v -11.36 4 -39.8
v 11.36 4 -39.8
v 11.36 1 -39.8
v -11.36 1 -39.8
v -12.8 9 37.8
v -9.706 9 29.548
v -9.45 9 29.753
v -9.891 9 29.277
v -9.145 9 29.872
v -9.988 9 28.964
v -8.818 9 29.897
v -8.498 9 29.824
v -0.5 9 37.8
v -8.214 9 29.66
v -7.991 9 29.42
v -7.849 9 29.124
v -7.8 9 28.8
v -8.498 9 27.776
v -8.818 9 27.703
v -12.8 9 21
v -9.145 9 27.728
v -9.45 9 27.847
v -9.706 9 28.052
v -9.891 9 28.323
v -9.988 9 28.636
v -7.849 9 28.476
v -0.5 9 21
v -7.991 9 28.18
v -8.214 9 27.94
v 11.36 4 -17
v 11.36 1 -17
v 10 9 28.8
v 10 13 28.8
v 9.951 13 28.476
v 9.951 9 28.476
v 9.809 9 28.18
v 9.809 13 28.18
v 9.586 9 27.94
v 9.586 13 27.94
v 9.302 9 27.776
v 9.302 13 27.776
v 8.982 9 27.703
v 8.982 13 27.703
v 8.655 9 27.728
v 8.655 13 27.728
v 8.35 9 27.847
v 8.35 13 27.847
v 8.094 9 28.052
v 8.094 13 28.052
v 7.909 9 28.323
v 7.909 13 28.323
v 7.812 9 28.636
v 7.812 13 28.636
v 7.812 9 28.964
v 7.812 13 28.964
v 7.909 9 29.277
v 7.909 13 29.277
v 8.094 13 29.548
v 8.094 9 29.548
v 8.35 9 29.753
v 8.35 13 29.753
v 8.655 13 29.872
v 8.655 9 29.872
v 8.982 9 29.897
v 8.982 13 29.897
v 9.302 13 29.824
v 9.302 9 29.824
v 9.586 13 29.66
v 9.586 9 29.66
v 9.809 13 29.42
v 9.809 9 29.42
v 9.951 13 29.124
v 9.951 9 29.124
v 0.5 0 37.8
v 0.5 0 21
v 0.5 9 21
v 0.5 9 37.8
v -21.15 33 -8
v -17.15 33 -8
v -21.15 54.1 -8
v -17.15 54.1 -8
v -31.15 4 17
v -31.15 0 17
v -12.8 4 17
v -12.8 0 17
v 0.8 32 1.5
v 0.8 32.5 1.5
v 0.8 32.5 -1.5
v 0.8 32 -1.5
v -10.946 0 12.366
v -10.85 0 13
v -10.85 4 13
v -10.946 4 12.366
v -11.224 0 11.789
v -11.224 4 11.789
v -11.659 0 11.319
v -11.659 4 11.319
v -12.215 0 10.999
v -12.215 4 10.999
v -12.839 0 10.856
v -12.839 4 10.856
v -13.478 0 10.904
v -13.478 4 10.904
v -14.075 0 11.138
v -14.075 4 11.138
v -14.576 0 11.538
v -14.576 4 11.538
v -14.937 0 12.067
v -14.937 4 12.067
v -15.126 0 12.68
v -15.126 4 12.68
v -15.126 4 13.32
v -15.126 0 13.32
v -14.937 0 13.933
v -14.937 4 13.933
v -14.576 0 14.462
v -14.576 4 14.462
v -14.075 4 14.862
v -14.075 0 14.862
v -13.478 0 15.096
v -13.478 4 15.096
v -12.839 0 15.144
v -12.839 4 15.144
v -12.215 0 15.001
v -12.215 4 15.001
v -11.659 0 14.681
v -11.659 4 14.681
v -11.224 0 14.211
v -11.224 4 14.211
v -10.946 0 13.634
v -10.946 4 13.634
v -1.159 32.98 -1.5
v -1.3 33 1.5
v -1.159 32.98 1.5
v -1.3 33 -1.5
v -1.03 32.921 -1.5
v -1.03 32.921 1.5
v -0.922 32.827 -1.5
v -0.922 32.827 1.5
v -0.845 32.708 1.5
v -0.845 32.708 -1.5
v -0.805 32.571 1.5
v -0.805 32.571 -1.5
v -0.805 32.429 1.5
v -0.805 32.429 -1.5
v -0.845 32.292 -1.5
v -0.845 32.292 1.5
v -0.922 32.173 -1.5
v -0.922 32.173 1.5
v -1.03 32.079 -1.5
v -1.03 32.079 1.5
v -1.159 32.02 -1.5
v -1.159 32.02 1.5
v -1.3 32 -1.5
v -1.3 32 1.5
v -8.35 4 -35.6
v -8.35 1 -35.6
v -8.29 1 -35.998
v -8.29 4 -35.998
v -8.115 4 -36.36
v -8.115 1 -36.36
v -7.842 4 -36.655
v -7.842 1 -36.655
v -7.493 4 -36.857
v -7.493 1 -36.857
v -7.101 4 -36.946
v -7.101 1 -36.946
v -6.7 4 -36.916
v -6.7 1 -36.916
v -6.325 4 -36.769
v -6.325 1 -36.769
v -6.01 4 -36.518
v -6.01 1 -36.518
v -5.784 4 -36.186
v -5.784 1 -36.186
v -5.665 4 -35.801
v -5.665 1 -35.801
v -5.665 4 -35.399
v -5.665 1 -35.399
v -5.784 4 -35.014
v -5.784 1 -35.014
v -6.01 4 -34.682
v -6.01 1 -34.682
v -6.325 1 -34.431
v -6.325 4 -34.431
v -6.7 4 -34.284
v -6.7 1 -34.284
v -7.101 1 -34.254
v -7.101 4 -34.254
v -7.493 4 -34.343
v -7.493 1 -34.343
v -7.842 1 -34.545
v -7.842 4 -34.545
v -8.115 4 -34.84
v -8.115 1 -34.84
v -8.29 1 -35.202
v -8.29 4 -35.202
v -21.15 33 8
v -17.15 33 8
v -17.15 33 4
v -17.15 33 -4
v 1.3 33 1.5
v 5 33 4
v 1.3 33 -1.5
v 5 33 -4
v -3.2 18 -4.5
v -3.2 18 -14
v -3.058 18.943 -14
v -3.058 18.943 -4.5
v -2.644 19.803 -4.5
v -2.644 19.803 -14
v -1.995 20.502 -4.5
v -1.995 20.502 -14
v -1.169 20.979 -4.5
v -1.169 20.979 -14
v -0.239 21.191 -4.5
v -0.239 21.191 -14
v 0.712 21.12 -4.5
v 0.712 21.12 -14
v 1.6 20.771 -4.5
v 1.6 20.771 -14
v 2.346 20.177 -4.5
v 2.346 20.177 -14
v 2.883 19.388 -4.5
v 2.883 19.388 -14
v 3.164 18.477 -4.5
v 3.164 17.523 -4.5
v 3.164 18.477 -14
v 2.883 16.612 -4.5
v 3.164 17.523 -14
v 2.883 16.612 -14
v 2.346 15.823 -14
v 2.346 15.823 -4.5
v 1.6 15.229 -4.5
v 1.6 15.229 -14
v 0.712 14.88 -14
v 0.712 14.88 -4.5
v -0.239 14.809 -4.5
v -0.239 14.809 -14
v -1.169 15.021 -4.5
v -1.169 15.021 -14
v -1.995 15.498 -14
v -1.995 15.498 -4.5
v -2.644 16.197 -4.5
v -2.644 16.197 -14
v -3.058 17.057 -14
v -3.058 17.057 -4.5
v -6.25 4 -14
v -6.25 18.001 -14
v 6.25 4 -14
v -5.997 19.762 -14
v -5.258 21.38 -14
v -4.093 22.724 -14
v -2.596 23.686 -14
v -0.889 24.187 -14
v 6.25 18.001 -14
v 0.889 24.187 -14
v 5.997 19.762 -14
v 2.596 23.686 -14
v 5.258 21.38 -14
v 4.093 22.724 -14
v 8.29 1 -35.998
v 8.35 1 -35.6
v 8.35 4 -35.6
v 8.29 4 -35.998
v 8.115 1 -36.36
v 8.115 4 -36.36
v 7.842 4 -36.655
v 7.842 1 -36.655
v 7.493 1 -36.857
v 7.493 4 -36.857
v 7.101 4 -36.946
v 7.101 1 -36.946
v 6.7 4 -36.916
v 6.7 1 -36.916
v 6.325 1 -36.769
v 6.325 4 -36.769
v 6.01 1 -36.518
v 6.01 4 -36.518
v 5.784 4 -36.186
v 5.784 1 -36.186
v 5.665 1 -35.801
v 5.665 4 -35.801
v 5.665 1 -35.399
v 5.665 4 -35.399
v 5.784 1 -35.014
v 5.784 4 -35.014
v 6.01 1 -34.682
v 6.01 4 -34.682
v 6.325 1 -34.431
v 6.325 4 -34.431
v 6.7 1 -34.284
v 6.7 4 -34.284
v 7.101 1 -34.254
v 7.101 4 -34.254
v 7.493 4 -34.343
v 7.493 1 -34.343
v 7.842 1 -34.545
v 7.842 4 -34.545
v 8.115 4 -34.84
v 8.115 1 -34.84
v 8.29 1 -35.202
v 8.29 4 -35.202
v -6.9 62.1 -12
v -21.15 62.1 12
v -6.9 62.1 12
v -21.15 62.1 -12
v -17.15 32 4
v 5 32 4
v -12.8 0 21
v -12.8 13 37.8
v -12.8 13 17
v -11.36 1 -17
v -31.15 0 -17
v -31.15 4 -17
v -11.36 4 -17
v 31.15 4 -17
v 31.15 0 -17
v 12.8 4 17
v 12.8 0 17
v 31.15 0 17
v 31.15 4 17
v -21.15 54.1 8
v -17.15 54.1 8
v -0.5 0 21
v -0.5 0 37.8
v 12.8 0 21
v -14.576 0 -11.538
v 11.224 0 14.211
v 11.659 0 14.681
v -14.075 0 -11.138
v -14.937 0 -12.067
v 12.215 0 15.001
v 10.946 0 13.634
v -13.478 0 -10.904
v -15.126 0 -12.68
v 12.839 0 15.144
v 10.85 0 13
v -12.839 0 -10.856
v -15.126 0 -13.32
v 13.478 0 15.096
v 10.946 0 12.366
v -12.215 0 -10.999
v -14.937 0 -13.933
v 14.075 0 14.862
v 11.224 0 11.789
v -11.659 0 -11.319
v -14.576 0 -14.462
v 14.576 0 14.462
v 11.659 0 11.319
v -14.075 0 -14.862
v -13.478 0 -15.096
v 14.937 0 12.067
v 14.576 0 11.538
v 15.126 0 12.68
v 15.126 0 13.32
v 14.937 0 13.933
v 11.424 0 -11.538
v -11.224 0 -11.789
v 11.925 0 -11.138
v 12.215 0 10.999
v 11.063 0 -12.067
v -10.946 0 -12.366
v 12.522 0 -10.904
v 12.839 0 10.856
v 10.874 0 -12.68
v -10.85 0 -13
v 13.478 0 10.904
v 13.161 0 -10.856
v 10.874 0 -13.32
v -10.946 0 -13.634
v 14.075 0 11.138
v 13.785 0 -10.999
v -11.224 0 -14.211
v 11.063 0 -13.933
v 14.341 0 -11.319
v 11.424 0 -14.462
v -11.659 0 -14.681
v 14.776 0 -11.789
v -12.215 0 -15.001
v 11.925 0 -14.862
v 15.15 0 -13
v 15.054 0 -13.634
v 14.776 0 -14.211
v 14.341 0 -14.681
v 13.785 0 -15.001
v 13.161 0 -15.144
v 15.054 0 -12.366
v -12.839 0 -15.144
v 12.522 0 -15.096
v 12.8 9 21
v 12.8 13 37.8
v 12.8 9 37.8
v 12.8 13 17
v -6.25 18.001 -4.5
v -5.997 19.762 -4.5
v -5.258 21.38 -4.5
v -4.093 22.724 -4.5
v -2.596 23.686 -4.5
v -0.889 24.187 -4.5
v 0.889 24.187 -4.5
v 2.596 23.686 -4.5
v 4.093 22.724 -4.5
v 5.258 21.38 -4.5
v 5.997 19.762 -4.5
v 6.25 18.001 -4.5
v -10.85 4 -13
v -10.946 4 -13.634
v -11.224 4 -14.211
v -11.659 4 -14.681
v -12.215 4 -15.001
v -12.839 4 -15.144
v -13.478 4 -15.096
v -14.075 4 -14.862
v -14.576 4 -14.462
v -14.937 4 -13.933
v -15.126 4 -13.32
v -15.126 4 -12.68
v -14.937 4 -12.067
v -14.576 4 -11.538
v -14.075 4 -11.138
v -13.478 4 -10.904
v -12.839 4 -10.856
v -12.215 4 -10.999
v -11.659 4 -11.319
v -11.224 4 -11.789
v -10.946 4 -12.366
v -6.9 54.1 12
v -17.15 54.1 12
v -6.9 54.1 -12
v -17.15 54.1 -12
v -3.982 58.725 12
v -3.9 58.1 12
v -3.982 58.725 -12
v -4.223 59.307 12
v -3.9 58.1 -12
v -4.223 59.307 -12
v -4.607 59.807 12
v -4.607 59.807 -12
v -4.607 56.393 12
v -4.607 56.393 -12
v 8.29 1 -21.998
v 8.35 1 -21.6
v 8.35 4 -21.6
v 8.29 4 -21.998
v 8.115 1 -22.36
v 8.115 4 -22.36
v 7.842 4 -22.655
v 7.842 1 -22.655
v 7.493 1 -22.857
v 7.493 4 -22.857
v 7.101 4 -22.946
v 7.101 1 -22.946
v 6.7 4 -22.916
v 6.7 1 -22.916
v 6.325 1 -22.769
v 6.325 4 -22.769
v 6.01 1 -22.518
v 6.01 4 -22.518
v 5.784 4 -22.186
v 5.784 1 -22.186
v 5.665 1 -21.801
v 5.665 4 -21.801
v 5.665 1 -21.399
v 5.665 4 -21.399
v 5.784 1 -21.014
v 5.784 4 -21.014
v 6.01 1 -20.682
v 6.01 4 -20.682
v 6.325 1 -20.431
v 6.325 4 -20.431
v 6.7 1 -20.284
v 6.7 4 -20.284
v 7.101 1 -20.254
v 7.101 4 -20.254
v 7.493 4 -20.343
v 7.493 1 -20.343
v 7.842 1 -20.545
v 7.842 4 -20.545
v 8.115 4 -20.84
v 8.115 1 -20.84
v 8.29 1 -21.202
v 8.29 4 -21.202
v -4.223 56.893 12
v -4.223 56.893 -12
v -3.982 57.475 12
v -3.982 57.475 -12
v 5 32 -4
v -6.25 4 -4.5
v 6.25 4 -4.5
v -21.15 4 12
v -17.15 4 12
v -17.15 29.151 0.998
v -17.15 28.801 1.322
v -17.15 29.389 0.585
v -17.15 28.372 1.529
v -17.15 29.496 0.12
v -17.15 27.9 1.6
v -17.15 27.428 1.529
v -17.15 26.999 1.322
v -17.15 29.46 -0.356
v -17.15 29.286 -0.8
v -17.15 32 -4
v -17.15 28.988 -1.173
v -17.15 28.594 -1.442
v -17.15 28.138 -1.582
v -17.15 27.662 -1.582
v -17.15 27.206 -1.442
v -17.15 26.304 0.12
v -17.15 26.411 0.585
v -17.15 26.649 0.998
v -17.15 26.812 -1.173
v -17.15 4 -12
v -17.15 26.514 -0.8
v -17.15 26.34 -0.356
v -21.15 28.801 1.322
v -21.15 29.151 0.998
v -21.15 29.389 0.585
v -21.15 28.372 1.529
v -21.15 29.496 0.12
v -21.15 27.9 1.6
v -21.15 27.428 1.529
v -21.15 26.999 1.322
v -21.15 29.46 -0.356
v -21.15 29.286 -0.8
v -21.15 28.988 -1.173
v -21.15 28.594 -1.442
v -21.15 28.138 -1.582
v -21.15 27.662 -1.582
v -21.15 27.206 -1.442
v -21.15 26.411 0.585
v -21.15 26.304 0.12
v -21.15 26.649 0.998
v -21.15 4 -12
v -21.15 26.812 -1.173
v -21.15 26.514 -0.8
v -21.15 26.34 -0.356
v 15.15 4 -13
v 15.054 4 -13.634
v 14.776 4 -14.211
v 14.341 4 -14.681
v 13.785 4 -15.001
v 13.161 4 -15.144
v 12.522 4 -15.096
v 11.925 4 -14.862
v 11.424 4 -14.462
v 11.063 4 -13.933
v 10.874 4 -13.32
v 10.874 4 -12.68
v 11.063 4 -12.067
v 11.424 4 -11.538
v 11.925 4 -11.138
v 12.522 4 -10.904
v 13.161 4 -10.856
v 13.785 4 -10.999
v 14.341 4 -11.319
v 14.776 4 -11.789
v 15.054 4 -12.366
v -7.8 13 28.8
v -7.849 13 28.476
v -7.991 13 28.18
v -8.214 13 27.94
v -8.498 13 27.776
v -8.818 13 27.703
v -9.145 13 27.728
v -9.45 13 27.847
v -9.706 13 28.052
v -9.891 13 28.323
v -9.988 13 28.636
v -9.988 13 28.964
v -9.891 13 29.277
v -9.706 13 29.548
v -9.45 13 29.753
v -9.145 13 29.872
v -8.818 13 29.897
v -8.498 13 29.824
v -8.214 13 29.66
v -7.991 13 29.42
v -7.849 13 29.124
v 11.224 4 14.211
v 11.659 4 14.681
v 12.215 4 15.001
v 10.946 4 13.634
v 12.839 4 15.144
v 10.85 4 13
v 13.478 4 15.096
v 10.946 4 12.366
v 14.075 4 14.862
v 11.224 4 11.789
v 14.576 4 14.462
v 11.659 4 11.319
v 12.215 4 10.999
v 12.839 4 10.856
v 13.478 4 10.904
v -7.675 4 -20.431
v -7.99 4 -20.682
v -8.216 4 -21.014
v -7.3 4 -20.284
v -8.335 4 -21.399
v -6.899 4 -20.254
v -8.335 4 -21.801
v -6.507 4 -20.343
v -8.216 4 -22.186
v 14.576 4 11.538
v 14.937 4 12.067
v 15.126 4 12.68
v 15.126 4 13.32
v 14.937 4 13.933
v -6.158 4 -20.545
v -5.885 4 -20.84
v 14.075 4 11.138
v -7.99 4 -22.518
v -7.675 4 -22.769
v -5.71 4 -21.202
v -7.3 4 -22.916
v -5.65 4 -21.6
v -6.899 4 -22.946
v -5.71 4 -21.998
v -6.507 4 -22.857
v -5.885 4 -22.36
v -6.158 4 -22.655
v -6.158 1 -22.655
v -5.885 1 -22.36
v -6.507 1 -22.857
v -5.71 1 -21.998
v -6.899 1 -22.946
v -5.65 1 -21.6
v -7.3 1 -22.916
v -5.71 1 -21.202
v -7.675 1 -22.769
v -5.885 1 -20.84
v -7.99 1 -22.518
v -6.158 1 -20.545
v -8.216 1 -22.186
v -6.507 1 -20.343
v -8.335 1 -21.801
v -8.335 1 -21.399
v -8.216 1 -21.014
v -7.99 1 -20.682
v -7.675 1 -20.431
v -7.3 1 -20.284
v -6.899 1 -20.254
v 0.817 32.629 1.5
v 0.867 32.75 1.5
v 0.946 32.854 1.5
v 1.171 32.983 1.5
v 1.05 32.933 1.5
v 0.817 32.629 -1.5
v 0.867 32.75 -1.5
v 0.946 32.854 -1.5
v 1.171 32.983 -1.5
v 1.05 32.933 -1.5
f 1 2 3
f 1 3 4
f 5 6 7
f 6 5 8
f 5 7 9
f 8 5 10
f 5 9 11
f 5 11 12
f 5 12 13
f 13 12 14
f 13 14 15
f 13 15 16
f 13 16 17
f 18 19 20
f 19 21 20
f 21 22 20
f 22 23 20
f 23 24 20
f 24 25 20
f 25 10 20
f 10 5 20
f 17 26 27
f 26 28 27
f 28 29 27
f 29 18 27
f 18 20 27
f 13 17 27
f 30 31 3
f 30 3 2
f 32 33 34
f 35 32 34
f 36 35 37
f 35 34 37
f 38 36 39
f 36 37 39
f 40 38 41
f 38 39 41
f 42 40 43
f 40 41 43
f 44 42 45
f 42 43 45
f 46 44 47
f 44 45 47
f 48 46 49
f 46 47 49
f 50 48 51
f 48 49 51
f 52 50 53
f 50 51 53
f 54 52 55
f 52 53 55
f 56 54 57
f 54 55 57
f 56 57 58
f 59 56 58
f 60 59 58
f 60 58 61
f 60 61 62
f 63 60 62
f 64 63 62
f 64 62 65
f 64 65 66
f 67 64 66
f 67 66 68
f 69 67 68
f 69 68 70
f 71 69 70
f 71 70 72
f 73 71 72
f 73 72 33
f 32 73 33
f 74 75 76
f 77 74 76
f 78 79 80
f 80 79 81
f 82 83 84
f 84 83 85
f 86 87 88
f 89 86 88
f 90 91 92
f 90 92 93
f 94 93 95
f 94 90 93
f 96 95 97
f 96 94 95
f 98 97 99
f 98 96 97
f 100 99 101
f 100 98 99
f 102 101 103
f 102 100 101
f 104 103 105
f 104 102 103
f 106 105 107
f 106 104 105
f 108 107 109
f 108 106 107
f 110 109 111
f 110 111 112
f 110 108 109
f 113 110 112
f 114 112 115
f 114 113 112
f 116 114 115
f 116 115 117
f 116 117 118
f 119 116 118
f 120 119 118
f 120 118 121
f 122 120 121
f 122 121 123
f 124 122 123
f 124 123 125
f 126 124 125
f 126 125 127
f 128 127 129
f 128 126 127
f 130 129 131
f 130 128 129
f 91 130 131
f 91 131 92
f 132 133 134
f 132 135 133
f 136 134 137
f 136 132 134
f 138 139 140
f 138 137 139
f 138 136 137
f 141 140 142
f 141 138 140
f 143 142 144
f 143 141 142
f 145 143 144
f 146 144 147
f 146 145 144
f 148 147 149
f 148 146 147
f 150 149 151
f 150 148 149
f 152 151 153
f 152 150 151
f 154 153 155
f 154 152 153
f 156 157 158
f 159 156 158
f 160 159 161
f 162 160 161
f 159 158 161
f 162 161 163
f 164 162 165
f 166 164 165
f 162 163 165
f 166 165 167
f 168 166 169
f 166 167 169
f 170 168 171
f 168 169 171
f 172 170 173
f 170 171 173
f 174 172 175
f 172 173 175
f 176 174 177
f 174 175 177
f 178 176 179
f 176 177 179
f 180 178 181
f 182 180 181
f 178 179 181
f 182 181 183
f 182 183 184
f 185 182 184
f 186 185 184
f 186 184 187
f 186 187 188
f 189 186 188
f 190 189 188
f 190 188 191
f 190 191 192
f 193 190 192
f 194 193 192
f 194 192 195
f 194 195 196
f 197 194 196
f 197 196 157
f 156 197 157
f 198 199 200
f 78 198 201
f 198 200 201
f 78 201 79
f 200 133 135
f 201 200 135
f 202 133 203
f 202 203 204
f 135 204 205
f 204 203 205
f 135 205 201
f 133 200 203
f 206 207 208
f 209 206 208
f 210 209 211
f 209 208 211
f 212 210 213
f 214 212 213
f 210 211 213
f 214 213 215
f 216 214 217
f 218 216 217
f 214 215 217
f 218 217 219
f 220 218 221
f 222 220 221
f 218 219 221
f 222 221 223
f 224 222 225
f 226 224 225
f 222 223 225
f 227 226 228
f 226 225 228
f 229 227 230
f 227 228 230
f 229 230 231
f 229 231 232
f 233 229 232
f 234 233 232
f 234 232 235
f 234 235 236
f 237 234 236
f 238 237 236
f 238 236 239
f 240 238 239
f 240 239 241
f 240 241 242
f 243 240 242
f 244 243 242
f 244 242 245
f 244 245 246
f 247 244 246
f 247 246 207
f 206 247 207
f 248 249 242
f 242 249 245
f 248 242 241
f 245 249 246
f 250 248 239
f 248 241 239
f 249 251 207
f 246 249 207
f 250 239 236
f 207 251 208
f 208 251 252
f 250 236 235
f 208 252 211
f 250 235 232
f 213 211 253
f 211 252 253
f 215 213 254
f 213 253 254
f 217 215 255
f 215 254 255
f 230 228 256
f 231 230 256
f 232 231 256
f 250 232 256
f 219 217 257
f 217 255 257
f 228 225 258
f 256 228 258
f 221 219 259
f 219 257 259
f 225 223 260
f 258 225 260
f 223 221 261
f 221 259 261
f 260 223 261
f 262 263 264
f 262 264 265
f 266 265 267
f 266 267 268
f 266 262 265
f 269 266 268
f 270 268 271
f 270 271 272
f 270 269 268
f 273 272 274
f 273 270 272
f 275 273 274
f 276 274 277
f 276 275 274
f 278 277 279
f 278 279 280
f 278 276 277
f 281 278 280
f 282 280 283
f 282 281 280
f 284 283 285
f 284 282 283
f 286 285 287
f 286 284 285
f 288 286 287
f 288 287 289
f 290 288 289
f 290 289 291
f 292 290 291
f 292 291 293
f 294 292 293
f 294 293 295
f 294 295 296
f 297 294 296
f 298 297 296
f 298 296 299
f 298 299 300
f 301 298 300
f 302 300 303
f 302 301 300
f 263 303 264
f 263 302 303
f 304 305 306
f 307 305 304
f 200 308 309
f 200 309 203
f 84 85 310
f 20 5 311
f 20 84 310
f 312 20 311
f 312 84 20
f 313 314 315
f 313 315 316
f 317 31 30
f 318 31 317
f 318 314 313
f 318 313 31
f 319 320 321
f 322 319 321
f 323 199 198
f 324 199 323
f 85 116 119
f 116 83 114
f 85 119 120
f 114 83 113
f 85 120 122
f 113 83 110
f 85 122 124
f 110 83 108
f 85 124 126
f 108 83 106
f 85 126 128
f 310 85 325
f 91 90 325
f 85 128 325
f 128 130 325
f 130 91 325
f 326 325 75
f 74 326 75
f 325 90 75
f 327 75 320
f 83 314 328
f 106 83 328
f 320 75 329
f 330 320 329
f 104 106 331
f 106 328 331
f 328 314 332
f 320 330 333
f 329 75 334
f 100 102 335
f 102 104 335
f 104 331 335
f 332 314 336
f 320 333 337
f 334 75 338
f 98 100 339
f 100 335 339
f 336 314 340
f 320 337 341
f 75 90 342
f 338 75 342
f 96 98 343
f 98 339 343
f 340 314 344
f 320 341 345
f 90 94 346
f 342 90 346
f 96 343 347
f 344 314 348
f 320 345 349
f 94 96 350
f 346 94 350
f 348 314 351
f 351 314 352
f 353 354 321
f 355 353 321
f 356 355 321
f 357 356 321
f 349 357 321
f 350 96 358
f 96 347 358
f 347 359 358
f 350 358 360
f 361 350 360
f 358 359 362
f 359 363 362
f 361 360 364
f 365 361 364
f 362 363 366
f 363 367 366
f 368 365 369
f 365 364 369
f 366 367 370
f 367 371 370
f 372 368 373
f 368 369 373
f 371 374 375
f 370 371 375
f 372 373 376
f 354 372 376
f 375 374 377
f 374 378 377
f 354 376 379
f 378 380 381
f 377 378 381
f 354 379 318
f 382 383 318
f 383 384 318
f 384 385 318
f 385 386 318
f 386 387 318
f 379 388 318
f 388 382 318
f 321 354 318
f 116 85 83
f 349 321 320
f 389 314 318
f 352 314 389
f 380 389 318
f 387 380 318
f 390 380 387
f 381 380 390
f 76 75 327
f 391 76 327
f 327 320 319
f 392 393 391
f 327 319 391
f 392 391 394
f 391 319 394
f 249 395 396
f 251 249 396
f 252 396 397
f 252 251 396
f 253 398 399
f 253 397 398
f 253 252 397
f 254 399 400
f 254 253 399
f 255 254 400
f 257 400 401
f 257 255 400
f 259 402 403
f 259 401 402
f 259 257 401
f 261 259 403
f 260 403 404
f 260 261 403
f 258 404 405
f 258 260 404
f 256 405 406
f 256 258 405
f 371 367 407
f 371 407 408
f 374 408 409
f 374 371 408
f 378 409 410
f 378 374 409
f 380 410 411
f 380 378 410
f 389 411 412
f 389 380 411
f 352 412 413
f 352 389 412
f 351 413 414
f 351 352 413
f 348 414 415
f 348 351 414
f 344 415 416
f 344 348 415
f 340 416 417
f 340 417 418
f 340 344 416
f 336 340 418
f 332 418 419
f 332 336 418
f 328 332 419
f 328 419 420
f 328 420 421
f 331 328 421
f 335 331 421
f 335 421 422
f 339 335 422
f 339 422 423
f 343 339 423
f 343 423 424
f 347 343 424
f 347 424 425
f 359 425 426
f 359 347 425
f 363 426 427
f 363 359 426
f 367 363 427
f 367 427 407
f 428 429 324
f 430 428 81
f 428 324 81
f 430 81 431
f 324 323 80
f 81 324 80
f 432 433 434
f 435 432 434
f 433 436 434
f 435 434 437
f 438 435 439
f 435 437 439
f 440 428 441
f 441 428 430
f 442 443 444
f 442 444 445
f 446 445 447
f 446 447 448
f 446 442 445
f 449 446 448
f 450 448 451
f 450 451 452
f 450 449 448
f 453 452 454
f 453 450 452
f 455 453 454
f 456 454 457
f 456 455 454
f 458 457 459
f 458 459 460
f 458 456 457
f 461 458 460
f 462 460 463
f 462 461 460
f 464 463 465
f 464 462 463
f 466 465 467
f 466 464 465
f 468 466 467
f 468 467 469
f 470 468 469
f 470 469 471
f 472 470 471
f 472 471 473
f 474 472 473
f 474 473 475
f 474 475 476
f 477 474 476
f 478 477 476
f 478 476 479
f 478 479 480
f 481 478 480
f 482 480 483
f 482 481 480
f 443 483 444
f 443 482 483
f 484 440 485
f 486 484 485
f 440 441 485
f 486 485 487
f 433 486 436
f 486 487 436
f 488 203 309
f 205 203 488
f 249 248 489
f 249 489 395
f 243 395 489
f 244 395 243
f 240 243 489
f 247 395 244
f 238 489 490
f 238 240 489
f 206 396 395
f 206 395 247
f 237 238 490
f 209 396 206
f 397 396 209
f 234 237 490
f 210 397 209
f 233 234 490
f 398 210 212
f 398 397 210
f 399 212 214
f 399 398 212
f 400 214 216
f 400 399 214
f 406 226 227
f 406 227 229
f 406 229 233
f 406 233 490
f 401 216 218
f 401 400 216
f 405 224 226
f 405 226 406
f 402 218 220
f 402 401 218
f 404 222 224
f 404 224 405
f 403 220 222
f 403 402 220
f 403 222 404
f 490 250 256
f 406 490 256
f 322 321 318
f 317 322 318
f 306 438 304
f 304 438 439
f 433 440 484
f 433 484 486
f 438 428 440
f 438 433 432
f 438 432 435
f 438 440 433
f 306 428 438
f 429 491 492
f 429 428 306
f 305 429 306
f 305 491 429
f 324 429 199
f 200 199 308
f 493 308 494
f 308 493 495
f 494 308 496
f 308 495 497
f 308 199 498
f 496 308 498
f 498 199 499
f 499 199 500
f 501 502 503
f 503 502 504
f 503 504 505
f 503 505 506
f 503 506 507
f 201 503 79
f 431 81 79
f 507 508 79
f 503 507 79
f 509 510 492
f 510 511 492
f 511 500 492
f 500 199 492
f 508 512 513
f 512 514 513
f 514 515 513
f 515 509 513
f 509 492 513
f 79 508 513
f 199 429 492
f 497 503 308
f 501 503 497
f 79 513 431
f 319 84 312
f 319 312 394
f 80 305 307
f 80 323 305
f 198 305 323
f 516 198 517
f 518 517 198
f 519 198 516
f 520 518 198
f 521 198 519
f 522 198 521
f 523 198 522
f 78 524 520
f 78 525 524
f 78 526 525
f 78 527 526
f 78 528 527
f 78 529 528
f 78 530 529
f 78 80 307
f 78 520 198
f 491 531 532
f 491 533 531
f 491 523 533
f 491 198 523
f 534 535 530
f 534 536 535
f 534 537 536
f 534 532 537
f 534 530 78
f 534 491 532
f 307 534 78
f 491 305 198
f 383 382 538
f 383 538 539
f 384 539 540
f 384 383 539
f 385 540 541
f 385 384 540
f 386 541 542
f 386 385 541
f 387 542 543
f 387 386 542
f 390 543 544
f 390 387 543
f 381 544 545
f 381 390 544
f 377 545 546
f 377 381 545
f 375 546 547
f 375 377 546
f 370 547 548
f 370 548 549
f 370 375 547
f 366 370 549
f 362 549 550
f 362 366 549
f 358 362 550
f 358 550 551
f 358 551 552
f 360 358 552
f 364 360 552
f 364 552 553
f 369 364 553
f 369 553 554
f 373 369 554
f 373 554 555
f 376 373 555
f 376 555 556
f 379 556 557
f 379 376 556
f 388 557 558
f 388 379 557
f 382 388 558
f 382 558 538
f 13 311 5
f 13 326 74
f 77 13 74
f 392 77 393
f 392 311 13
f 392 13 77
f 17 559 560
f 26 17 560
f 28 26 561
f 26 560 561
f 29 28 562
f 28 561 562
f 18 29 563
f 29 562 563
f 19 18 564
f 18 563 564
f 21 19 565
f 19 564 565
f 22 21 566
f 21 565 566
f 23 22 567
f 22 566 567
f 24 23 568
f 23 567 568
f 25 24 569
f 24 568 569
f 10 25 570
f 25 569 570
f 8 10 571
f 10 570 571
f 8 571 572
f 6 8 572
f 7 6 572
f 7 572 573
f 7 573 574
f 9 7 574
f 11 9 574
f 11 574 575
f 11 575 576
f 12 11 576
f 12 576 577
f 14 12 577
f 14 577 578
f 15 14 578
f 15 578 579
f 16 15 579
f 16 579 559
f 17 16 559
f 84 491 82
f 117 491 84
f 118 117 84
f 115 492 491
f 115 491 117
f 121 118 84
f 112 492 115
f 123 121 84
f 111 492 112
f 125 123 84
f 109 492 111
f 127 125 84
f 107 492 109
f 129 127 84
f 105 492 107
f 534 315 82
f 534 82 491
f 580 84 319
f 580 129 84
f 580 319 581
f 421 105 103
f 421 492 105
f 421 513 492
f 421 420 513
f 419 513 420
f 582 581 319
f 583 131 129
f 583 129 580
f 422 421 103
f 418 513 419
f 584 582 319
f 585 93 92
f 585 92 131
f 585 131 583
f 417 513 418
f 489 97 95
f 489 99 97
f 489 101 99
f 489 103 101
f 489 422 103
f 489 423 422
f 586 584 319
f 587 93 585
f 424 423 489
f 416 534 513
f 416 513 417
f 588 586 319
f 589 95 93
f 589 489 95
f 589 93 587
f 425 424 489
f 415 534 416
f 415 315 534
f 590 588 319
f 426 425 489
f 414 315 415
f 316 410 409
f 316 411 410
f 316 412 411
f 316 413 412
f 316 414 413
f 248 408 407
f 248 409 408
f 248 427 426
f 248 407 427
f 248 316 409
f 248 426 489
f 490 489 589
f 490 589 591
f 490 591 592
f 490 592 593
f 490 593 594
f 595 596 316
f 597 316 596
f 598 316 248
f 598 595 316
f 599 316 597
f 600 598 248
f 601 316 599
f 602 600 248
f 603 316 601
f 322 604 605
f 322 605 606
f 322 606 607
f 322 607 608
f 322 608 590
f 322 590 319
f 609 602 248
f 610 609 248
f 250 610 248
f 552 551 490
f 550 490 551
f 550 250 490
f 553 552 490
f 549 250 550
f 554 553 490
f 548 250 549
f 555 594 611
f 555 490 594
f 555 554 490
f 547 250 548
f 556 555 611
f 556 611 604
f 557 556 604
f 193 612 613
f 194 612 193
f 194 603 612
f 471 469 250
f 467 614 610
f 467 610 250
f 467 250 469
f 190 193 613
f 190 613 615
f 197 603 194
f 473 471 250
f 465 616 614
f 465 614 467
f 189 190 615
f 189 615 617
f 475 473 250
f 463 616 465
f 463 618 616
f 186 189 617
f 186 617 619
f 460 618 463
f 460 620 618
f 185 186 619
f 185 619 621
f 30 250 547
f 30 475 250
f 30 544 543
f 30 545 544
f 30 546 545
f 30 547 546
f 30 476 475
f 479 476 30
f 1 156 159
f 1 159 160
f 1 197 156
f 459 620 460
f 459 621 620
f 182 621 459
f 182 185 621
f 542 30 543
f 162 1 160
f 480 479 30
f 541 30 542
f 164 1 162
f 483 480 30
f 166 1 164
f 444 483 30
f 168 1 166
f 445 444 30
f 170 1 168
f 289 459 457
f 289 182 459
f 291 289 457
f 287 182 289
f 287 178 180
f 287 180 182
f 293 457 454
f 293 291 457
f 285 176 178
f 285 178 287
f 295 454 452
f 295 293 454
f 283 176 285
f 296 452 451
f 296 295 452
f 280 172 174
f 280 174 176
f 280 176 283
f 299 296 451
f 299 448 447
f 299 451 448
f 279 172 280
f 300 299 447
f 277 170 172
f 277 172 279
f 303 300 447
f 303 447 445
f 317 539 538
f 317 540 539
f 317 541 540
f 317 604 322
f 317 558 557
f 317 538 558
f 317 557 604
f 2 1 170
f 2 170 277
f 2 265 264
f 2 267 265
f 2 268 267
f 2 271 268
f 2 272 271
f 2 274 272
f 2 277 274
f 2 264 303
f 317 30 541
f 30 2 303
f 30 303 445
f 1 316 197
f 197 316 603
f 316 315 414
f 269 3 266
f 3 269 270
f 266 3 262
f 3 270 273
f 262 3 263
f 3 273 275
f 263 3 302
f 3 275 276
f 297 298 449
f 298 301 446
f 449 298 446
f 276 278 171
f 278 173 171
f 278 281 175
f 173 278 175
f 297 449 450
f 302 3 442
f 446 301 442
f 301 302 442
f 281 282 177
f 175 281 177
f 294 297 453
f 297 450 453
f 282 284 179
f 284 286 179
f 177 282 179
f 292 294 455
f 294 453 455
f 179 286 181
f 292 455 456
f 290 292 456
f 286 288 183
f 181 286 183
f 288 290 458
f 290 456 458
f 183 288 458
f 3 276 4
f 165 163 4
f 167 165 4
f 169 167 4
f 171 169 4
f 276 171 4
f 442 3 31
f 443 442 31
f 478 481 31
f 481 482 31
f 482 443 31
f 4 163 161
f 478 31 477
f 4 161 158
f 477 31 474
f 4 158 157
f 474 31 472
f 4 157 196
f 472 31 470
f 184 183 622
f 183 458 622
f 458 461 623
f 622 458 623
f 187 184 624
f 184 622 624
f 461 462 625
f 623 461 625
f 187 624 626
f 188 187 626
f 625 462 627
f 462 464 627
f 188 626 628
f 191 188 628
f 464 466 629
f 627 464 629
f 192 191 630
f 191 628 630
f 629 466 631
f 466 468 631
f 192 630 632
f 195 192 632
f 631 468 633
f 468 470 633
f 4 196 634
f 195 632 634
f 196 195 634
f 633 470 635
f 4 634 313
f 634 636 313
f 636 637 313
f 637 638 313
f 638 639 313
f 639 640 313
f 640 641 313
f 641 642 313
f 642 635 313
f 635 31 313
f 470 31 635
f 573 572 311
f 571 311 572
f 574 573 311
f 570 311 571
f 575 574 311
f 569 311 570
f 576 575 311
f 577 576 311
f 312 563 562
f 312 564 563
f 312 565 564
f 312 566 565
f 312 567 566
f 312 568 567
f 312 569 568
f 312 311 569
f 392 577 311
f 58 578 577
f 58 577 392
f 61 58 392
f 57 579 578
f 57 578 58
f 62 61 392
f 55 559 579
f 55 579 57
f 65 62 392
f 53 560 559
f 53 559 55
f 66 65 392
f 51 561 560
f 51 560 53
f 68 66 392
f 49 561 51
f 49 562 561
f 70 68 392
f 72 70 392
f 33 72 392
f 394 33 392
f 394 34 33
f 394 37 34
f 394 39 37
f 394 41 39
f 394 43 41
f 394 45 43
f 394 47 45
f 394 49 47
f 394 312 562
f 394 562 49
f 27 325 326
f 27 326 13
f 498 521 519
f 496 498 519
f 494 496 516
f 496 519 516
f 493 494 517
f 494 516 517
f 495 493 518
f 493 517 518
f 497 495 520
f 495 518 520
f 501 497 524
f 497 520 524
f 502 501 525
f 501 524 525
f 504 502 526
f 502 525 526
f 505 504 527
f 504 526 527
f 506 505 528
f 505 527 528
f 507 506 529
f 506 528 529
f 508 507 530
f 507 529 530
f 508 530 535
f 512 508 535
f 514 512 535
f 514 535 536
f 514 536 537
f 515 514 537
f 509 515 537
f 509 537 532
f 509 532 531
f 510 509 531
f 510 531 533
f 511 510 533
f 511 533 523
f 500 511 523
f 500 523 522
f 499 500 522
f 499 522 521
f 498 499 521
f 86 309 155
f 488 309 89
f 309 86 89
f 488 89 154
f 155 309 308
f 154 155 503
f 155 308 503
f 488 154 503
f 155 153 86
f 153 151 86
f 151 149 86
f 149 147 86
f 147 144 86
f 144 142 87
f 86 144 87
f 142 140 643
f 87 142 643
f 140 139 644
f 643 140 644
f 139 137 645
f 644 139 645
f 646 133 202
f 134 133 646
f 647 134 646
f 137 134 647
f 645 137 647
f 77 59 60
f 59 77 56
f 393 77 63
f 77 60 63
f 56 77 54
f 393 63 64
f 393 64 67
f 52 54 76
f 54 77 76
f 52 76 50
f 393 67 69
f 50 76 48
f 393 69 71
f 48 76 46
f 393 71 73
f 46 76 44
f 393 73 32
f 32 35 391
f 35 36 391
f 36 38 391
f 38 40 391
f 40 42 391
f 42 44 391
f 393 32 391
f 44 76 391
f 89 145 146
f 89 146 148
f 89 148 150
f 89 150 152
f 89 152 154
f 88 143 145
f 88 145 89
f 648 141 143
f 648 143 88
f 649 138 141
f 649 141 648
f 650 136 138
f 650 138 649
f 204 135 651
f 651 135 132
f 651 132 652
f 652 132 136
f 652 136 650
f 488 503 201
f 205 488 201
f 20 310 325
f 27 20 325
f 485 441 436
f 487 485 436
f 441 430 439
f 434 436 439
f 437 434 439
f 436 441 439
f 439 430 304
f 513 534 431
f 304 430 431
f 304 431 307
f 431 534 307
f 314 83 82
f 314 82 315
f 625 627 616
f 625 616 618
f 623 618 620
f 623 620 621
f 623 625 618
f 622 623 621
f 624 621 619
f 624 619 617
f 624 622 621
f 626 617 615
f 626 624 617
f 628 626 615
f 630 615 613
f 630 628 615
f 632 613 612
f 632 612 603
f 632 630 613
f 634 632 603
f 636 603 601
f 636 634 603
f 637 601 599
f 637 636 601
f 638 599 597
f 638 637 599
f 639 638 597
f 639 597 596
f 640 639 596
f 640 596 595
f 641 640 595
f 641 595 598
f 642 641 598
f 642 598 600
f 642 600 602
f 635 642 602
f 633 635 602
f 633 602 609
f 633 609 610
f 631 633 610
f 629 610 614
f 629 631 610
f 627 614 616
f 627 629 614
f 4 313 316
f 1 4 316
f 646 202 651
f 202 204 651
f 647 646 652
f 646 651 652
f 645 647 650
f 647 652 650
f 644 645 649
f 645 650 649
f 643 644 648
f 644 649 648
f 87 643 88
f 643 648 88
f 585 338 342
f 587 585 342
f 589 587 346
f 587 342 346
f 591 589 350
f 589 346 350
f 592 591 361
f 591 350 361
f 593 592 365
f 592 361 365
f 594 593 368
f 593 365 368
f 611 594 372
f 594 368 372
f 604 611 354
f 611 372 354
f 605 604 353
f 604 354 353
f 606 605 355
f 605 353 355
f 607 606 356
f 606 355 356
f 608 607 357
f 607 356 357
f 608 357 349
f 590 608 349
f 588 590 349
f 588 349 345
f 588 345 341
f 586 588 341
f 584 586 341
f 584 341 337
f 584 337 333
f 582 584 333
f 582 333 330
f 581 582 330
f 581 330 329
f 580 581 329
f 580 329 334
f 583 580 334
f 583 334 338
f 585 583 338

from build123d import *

# Parameters (mm, degrees)
SKETCH_1_W                 = 62.3
SKETCH_1_H                 = 34
EXTRUDE_346_DEPTH          = 4
HOLE_WIZARD_M4_1_D         = 4.3
PATTERN_SKETCH_1_OUTLINE_R = 2.15
PATTERN_SKETCH_1_DEPTH     = 4
SKETCH_6_W                 = 22.72
SKETCH_6_H                 = 3
EXTRUDE_2_DEPTH            = 22.8
HOLE_WIZARD_M2_5_1_D       = 2.7
PATTERN_START              = 1
PATTERN_SKETCH_2_OUTLINE_R = 1.35
PATTERN_SKETCH_2_DEPTH     = 3
SKETCH_11_W                = 25.6
SKETCH_11_H                = 4
EXTRUDE_5_DEPTH            = 4
SKETCH_12_W                = 25.6
SKETCH_12_H                = 4
EXTRUDE_6_DEPTH            = 9
SKETCH_13_W                = 25.6
SKETCH_13_H                = 4
EXTRUDE_7_DEPTH            = 16.8
HOLE_WIZARD_M2_1_D         = 2.2
EXTRUDE_START              = -14
EXTRUDE_8_OUTLINE_W        = 12.5
EXTRUDE_8_OUTLINE_H        = 20.251
EXTRUDE_8_OUTLINE_R        = 0.25
EXTRUDE_8_DEPTH            = 9.5
CUT_EXTRUDE_1_REACH        = 67.128
SKETCH_18_R                = 3.2
FILLET_1_RADIUS            = 6.25
FILLET_1_LENGTH            = 9.5
SKETCH_19_W                = 4
SKETCH_19_H                = 24
EXTRUDE_10_DEPTH           = 29
SKETCH_20_W                = 8
SKETCH_20_H                = 1
EXTRUDE_11_DEPTH           = 22.15
CUT_EXTRUDE_3_REACH        = 62.36
SKETCH_22_W                = 1.6
SKETCH_22_H                = 3
FILLET_2_RADIUS            = 0.5
FILLET_2_LENGTH            = 3
FILLET_3_R                 = 0.5
SKETCH_23_W                = 1
SKETCH_23_H                = 9
EXTRUDE_12_DEPTH           = 16.8
HOLE_WIZARD_M3_1_D         = 3.2
EXTRUDE_START_2            = 29
SKETCH_19_2_W              = 4
SKETCH_19_2_H              = 24
EXTRUDE_17_DEPTH           = 29.1
CUT_EXTRUDE_4_REACH        = 90.167
SKETCH_29_W                = 16
SKETCH_29_H                = 21.1
SKETCH_30_W                = 24
SKETCH_30_H                = 8
EXTRUDE_18_DEPTH           = 13.25
CHAMFER_1_SIZE             = 3
FILLET_4_R                 = 2.414214


# Read off the part's stored shape, not the designer's step: 草图阵列1, 草图阵列2, 凸台-拉伸8
with BuildPart() as part:
    # 草图1 → Extrude 346 (new body)
    with BuildSketch(Plane(origin=(0, 0, 0), x_dir=(1, 0, 0), z_dir=(0, 1, 0))):
        Rectangle(SKETCH_1_W, SKETCH_1_H)
    extrude(amount=EXTRUDE_346_DEPTH)

    # M4 间隙孔1 (through all)
    with Locations(Plane(origin=(0, 4, 0), x_dir=(1, 0, 0), z_dir=(0, 1, 0))):
        with Locations((13, -13)):
            Hole(HOLE_WIZARD_M4_1_D / 2)

    # 草图阵列1 outline → 草图阵列1 (cut)
    with BuildSketch(Plane(origin=(0, 0, 0), x_dir=(1, 0, 0), z_dir=(0, 1, 0))):
        with Locations((-13, 13)):
            Circle(PATTERN_SKETCH_1_OUTLINE_R)
        with Locations((-13, -13)):
            Circle(PATTERN_SKETCH_1_OUTLINE_R)
        with Locations((13, 13)):
            Circle(PATTERN_SKETCH_1_OUTLINE_R)
    extrude(amount=PATTERN_SKETCH_1_DEPTH, mode=Mode.SUBTRACT)

    # 草图6 → 凸台-拉伸2 (add)
    with BuildSketch(Plane(origin=(0, 0, -17), x_dir=(-1, 0, 0), z_dir=(0, 0, -1))):
        with Locations((0, 2.5)):
            Rectangle(SKETCH_6_W, SKETCH_6_H)
    extrude(amount=EXTRUDE_2_DEPTH)

    # M2.5 间隙孔1 (through all)
    with Locations(Plane(origin=(0, 4, 0), x_dir=(1, 0, 0), z_dir=(0, 1, 0))):
        with Locations((-7, 35.6)):
            Hole(HOLE_WIZARD_M2_5_1_D / 2)

    # 草图阵列2 outline → 草图阵列2 (cut)
    with BuildSketch(Plane(origin=(0, 0, 0), x_dir=(1, 0, 0), z_dir=(0, 1, 0)).offset(PATTERN_START)):
        with Locations((7, 21.6)):
            Circle(PATTERN_SKETCH_2_OUTLINE_R)
        with Locations((7, 35.6)):
            Circle(PATTERN_SKETCH_2_OUTLINE_R)
        with Locations((-7, 21.6)):
            Circle(PATTERN_SKETCH_2_OUTLINE_R)
    extrude(amount=PATTERN_SKETCH_2_DEPTH, mode=Mode.SUBTRACT)

    # 草图11 → 凸台-拉伸5 (add)
    with BuildSketch(Plane.XY.offset(17)):
        with Locations((0, 2)):
            Rectangle(SKETCH_11_W, SKETCH_11_H)
    extrude(amount=EXTRUDE_5_DEPTH)

    # 草图12 → 凸台-拉伸6 (add)
    with BuildSketch(Plane(origin=(0, 4, 0), x_dir=(1, 0, 0), z_dir=(0, 1, 0))):
        with Locations((0, -19)):
            Rectangle(SKETCH_12_W, SKETCH_12_H)
    extrude(amount=EXTRUDE_6_DEPTH)

    # 草图13 → 凸台-拉伸7 (add)
    with BuildSketch(Plane.XY.offset(21)):
        with Locations((0, 11)):
            Rectangle(SKETCH_13_W, SKETCH_13_H)
    extrude(amount=EXTRUDE_7_DEPTH)

    # M2 间隙孔1 (through all)
    with Locations(Plane(origin=(0, 9, 0), x_dir=(-1, 0, 0), z_dir=(0, -1, 0))):
        with Locations((8.9, -28.8), (-8.9, -28.8)):
            Hole(HOLE_WIZARD_M2_1_D / 2)

    # 凸台-拉伸8 outline → 凸台-拉伸8 (add)
    with BuildSketch(Plane.XY.offset(EXTRUDE_START)):
        with Locations((0, 14.1255)):
            Rectangle(EXTRUDE_8_OUTLINE_W, EXTRUDE_8_OUTLINE_H)
        with Locations((0, 18)):
            Circle(EXTRUDE_8_OUTLINE_R, mode=Mode.SUBTRACT)
    extrude(amount=EXTRUDE_8_DEPTH)

    # 草图18 → 切除-拉伸1 (cut, up to next)
    with BuildSketch(Plane(origin=(0, 0, -14), x_dir=(-1, 0, 0), z_dir=(0, 0, -1)), mode=Mode.PRIVATE) as cut_extrude_1_sk1:
        with Locations((0, 18)):
            Circle(SKETCH_18_R)
    cut_extrude_1_tool1 = extrude(cut_extrude_1_sk1.sketch, amount=-CUT_EXTRUDE_1_REACH, mode=Mode.PRIVATE) & part.part
    add(cut_extrude_1_tool1.solids().sort_by_distance((0, 18, -14))[0], mode=Mode.SUBTRACT)

    # 圆角1: full round fillet: the end face becomes a half cylinder, R = half its width
    fillet_1_face = Plane((0, 24.251, -9.25), x_dir=(0, 0, -1), z_dir=(0, 1, 0))  # on the end face: x along it, z out of the body
    fillet_1_slab = fillet_1_face.offset(-FILLET_1_RADIUS / 2) * Box(FILLET_1_LENGTH, 2 * FILLET_1_RADIUS, FILLET_1_RADIUS, mode=Mode.PRIVATE)  # the body's end, R deep
    fillet_1_round = Plane((0, 18.001, -9.25), x_dir=(0, 1, 0), z_dir=(0, 0, -1)) * Cylinder(FILLET_1_RADIUS, FILLET_1_LENGTH, mode=Mode.PRIVATE)  # its axis R under the face
    add(fillet_1_slab - fillet_1_round, mode=Mode.SUBTRACT)

    # 草图19 → 凸台-拉伸10 (add)
    with BuildSketch(Plane(origin=(0, 4, 0), x_dir=(1, 0, 0), z_dir=(0, 1, 0))):
        with Locations((-19.15, 0)):
            Rectangle(SKETCH_19_W, SKETCH_19_H)
    extrude(amount=EXTRUDE_10_DEPTH)

    # 草图20 → 凸台-拉伸11 (add)
    with BuildSketch(Plane(origin=(-17.15, 0, 0), x_dir=(0, 0, -1), z_dir=(1, 0, 0))):
        with Locations((0, 32.5)):
            Rectangle(SKETCH_20_W, SKETCH_20_H)
    extrude(amount=EXTRUDE_11_DEPTH)

    # 草图22 → 切除-拉伸3 (cut, up to next)
    with BuildSketch(Plane(origin=(0, 33, 0), x_dir=(1, 0, 0), z_dir=(0, 1, 0)), mode=Mode.PRIVATE) as cut_extrude_3_sk1:
        Rectangle(SKETCH_22_W, SKETCH_22_H)
    cut_extrude_3_tool1 = extrude(cut_extrude_3_sk1.sketch, amount=-CUT_EXTRUDE_3_REACH, mode=Mode.PRIVATE) & part.part
    add(cut_extrude_3_tool1.solids().sort_by_distance((0, 33, 0))[0], mode=Mode.SUBTRACT)

    # 圆角2: full round fillet: the end face becomes a half cylinder, R = half its width
    fillet_2_face = Plane((-0.8, 32.5, 0), x_dir=(0, 0, -1), z_dir=(1, 0, 0))  # on the end face: x along it, z out of the body
    fillet_2_slab = fillet_2_face.offset(-FILLET_2_RADIUS / 2) * Box(FILLET_2_LENGTH, 2 * FILLET_2_RADIUS, FILLET_2_RADIUS, mode=Mode.PRIVATE)  # the body's end, R deep
    fillet_2_round = Plane((-1.3, 32.5, 0), x_dir=(1, 0, 0), z_dir=(0, 0, -1)) * Cylinder(FILLET_2_RADIUS, FILLET_2_LENGTH, mode=Mode.PRIVATE)  # its axis R under the face
    add(fillet_2_slab - fillet_2_round, mode=Mode.SUBTRACT)

    # 圆角3
    fillet_3_edges = [part.edges().sort_by_distance(p)[0] for p in [
        (0.8, 33, 0),
    ]]
    fillet(fillet_3_edges, radius=FILLET_3_R)

    # 草图23 → 凸台-拉伸12 (add)
    with BuildSketch(Plane.XY.offset(21)):
        with Locations((0, 4.5)):
            Rectangle(SKETCH_23_W, SKETCH_23_H)
    extrude(amount=EXTRUDE_12_DEPTH)

    # M3 间隙孔1 (through all)
    with Locations(Plane(origin=(-17.15, 0, 0), x_dir=(0, 0, -1), z_dir=(1, 0, 0))):
        with Locations((0, 27.9)):
            Hole(HOLE_WIZARD_M3_1_D / 2)

    # 草图19<2> → 凸台-拉伸17 (add)
    with BuildSketch(Plane(origin=(0, 4, 0), x_dir=(1, 0, 0), z_dir=(0, 1, 0)).offset(EXTRUDE_START_2)):
        with Locations((-19.15, 0)):
            Rectangle(SKETCH_19_2_W, SKETCH_19_2_H)
    extrude(amount=EXTRUDE_17_DEPTH)

    # 草图29 → 切除-拉伸4 (cut, up to next)
    with BuildSketch(Plane(origin=(-17.15, 0, 0), x_dir=(0, 0, -1), z_dir=(1, 0, 0)), mode=Mode.PRIVATE) as cut_extrude_4_sk1:
        with Locations((0, 43.55)):
            Rectangle(SKETCH_29_W, SKETCH_29_H)
    cut_extrude_4_tool1 = extrude(cut_extrude_4_sk1.sketch, amount=-CUT_EXTRUDE_4_REACH, mode=Mode.PRIVATE) & part.part
    add(cut_extrude_4_tool1.solids().sort_by_distance((-17.15, 43.55, 0))[0], mode=Mode.SUBTRACT)

    # 草图30 → 凸台-拉伸18 (add)
    with BuildSketch(Plane(origin=(-17.15, 0, 0), x_dir=(0, 0, -1), z_dir=(1, 0, 0))):
        with Locations((0, 58.1)):
            Rectangle(SKETCH_30_W, SKETCH_30_H)
    extrude(amount=EXTRUDE_18_DEPTH)

    # 倒角1
    chamfer_1_edges = [part.edges().sort_by_distance(p)[0] for p in [
        (-3.9, 62.1, 0),
        (-3.9, 54.1, 0),
    ]]
    chamfer(chamfer_1_edges, length=CHAMFER_1_SIZE)

    # 圆角4
    fillet_4_edges = [part.edges().sort_by_distance(p)[0] for p in [
        (-3.9, 57.1, 0),
        (-3.9, 59.1, 0),
    ]]
    fillet(fillet_4_edges, radius=FILLET_4_R - 0.0001)  # a hair under: the kernel refuses the full size


solid = part.part
